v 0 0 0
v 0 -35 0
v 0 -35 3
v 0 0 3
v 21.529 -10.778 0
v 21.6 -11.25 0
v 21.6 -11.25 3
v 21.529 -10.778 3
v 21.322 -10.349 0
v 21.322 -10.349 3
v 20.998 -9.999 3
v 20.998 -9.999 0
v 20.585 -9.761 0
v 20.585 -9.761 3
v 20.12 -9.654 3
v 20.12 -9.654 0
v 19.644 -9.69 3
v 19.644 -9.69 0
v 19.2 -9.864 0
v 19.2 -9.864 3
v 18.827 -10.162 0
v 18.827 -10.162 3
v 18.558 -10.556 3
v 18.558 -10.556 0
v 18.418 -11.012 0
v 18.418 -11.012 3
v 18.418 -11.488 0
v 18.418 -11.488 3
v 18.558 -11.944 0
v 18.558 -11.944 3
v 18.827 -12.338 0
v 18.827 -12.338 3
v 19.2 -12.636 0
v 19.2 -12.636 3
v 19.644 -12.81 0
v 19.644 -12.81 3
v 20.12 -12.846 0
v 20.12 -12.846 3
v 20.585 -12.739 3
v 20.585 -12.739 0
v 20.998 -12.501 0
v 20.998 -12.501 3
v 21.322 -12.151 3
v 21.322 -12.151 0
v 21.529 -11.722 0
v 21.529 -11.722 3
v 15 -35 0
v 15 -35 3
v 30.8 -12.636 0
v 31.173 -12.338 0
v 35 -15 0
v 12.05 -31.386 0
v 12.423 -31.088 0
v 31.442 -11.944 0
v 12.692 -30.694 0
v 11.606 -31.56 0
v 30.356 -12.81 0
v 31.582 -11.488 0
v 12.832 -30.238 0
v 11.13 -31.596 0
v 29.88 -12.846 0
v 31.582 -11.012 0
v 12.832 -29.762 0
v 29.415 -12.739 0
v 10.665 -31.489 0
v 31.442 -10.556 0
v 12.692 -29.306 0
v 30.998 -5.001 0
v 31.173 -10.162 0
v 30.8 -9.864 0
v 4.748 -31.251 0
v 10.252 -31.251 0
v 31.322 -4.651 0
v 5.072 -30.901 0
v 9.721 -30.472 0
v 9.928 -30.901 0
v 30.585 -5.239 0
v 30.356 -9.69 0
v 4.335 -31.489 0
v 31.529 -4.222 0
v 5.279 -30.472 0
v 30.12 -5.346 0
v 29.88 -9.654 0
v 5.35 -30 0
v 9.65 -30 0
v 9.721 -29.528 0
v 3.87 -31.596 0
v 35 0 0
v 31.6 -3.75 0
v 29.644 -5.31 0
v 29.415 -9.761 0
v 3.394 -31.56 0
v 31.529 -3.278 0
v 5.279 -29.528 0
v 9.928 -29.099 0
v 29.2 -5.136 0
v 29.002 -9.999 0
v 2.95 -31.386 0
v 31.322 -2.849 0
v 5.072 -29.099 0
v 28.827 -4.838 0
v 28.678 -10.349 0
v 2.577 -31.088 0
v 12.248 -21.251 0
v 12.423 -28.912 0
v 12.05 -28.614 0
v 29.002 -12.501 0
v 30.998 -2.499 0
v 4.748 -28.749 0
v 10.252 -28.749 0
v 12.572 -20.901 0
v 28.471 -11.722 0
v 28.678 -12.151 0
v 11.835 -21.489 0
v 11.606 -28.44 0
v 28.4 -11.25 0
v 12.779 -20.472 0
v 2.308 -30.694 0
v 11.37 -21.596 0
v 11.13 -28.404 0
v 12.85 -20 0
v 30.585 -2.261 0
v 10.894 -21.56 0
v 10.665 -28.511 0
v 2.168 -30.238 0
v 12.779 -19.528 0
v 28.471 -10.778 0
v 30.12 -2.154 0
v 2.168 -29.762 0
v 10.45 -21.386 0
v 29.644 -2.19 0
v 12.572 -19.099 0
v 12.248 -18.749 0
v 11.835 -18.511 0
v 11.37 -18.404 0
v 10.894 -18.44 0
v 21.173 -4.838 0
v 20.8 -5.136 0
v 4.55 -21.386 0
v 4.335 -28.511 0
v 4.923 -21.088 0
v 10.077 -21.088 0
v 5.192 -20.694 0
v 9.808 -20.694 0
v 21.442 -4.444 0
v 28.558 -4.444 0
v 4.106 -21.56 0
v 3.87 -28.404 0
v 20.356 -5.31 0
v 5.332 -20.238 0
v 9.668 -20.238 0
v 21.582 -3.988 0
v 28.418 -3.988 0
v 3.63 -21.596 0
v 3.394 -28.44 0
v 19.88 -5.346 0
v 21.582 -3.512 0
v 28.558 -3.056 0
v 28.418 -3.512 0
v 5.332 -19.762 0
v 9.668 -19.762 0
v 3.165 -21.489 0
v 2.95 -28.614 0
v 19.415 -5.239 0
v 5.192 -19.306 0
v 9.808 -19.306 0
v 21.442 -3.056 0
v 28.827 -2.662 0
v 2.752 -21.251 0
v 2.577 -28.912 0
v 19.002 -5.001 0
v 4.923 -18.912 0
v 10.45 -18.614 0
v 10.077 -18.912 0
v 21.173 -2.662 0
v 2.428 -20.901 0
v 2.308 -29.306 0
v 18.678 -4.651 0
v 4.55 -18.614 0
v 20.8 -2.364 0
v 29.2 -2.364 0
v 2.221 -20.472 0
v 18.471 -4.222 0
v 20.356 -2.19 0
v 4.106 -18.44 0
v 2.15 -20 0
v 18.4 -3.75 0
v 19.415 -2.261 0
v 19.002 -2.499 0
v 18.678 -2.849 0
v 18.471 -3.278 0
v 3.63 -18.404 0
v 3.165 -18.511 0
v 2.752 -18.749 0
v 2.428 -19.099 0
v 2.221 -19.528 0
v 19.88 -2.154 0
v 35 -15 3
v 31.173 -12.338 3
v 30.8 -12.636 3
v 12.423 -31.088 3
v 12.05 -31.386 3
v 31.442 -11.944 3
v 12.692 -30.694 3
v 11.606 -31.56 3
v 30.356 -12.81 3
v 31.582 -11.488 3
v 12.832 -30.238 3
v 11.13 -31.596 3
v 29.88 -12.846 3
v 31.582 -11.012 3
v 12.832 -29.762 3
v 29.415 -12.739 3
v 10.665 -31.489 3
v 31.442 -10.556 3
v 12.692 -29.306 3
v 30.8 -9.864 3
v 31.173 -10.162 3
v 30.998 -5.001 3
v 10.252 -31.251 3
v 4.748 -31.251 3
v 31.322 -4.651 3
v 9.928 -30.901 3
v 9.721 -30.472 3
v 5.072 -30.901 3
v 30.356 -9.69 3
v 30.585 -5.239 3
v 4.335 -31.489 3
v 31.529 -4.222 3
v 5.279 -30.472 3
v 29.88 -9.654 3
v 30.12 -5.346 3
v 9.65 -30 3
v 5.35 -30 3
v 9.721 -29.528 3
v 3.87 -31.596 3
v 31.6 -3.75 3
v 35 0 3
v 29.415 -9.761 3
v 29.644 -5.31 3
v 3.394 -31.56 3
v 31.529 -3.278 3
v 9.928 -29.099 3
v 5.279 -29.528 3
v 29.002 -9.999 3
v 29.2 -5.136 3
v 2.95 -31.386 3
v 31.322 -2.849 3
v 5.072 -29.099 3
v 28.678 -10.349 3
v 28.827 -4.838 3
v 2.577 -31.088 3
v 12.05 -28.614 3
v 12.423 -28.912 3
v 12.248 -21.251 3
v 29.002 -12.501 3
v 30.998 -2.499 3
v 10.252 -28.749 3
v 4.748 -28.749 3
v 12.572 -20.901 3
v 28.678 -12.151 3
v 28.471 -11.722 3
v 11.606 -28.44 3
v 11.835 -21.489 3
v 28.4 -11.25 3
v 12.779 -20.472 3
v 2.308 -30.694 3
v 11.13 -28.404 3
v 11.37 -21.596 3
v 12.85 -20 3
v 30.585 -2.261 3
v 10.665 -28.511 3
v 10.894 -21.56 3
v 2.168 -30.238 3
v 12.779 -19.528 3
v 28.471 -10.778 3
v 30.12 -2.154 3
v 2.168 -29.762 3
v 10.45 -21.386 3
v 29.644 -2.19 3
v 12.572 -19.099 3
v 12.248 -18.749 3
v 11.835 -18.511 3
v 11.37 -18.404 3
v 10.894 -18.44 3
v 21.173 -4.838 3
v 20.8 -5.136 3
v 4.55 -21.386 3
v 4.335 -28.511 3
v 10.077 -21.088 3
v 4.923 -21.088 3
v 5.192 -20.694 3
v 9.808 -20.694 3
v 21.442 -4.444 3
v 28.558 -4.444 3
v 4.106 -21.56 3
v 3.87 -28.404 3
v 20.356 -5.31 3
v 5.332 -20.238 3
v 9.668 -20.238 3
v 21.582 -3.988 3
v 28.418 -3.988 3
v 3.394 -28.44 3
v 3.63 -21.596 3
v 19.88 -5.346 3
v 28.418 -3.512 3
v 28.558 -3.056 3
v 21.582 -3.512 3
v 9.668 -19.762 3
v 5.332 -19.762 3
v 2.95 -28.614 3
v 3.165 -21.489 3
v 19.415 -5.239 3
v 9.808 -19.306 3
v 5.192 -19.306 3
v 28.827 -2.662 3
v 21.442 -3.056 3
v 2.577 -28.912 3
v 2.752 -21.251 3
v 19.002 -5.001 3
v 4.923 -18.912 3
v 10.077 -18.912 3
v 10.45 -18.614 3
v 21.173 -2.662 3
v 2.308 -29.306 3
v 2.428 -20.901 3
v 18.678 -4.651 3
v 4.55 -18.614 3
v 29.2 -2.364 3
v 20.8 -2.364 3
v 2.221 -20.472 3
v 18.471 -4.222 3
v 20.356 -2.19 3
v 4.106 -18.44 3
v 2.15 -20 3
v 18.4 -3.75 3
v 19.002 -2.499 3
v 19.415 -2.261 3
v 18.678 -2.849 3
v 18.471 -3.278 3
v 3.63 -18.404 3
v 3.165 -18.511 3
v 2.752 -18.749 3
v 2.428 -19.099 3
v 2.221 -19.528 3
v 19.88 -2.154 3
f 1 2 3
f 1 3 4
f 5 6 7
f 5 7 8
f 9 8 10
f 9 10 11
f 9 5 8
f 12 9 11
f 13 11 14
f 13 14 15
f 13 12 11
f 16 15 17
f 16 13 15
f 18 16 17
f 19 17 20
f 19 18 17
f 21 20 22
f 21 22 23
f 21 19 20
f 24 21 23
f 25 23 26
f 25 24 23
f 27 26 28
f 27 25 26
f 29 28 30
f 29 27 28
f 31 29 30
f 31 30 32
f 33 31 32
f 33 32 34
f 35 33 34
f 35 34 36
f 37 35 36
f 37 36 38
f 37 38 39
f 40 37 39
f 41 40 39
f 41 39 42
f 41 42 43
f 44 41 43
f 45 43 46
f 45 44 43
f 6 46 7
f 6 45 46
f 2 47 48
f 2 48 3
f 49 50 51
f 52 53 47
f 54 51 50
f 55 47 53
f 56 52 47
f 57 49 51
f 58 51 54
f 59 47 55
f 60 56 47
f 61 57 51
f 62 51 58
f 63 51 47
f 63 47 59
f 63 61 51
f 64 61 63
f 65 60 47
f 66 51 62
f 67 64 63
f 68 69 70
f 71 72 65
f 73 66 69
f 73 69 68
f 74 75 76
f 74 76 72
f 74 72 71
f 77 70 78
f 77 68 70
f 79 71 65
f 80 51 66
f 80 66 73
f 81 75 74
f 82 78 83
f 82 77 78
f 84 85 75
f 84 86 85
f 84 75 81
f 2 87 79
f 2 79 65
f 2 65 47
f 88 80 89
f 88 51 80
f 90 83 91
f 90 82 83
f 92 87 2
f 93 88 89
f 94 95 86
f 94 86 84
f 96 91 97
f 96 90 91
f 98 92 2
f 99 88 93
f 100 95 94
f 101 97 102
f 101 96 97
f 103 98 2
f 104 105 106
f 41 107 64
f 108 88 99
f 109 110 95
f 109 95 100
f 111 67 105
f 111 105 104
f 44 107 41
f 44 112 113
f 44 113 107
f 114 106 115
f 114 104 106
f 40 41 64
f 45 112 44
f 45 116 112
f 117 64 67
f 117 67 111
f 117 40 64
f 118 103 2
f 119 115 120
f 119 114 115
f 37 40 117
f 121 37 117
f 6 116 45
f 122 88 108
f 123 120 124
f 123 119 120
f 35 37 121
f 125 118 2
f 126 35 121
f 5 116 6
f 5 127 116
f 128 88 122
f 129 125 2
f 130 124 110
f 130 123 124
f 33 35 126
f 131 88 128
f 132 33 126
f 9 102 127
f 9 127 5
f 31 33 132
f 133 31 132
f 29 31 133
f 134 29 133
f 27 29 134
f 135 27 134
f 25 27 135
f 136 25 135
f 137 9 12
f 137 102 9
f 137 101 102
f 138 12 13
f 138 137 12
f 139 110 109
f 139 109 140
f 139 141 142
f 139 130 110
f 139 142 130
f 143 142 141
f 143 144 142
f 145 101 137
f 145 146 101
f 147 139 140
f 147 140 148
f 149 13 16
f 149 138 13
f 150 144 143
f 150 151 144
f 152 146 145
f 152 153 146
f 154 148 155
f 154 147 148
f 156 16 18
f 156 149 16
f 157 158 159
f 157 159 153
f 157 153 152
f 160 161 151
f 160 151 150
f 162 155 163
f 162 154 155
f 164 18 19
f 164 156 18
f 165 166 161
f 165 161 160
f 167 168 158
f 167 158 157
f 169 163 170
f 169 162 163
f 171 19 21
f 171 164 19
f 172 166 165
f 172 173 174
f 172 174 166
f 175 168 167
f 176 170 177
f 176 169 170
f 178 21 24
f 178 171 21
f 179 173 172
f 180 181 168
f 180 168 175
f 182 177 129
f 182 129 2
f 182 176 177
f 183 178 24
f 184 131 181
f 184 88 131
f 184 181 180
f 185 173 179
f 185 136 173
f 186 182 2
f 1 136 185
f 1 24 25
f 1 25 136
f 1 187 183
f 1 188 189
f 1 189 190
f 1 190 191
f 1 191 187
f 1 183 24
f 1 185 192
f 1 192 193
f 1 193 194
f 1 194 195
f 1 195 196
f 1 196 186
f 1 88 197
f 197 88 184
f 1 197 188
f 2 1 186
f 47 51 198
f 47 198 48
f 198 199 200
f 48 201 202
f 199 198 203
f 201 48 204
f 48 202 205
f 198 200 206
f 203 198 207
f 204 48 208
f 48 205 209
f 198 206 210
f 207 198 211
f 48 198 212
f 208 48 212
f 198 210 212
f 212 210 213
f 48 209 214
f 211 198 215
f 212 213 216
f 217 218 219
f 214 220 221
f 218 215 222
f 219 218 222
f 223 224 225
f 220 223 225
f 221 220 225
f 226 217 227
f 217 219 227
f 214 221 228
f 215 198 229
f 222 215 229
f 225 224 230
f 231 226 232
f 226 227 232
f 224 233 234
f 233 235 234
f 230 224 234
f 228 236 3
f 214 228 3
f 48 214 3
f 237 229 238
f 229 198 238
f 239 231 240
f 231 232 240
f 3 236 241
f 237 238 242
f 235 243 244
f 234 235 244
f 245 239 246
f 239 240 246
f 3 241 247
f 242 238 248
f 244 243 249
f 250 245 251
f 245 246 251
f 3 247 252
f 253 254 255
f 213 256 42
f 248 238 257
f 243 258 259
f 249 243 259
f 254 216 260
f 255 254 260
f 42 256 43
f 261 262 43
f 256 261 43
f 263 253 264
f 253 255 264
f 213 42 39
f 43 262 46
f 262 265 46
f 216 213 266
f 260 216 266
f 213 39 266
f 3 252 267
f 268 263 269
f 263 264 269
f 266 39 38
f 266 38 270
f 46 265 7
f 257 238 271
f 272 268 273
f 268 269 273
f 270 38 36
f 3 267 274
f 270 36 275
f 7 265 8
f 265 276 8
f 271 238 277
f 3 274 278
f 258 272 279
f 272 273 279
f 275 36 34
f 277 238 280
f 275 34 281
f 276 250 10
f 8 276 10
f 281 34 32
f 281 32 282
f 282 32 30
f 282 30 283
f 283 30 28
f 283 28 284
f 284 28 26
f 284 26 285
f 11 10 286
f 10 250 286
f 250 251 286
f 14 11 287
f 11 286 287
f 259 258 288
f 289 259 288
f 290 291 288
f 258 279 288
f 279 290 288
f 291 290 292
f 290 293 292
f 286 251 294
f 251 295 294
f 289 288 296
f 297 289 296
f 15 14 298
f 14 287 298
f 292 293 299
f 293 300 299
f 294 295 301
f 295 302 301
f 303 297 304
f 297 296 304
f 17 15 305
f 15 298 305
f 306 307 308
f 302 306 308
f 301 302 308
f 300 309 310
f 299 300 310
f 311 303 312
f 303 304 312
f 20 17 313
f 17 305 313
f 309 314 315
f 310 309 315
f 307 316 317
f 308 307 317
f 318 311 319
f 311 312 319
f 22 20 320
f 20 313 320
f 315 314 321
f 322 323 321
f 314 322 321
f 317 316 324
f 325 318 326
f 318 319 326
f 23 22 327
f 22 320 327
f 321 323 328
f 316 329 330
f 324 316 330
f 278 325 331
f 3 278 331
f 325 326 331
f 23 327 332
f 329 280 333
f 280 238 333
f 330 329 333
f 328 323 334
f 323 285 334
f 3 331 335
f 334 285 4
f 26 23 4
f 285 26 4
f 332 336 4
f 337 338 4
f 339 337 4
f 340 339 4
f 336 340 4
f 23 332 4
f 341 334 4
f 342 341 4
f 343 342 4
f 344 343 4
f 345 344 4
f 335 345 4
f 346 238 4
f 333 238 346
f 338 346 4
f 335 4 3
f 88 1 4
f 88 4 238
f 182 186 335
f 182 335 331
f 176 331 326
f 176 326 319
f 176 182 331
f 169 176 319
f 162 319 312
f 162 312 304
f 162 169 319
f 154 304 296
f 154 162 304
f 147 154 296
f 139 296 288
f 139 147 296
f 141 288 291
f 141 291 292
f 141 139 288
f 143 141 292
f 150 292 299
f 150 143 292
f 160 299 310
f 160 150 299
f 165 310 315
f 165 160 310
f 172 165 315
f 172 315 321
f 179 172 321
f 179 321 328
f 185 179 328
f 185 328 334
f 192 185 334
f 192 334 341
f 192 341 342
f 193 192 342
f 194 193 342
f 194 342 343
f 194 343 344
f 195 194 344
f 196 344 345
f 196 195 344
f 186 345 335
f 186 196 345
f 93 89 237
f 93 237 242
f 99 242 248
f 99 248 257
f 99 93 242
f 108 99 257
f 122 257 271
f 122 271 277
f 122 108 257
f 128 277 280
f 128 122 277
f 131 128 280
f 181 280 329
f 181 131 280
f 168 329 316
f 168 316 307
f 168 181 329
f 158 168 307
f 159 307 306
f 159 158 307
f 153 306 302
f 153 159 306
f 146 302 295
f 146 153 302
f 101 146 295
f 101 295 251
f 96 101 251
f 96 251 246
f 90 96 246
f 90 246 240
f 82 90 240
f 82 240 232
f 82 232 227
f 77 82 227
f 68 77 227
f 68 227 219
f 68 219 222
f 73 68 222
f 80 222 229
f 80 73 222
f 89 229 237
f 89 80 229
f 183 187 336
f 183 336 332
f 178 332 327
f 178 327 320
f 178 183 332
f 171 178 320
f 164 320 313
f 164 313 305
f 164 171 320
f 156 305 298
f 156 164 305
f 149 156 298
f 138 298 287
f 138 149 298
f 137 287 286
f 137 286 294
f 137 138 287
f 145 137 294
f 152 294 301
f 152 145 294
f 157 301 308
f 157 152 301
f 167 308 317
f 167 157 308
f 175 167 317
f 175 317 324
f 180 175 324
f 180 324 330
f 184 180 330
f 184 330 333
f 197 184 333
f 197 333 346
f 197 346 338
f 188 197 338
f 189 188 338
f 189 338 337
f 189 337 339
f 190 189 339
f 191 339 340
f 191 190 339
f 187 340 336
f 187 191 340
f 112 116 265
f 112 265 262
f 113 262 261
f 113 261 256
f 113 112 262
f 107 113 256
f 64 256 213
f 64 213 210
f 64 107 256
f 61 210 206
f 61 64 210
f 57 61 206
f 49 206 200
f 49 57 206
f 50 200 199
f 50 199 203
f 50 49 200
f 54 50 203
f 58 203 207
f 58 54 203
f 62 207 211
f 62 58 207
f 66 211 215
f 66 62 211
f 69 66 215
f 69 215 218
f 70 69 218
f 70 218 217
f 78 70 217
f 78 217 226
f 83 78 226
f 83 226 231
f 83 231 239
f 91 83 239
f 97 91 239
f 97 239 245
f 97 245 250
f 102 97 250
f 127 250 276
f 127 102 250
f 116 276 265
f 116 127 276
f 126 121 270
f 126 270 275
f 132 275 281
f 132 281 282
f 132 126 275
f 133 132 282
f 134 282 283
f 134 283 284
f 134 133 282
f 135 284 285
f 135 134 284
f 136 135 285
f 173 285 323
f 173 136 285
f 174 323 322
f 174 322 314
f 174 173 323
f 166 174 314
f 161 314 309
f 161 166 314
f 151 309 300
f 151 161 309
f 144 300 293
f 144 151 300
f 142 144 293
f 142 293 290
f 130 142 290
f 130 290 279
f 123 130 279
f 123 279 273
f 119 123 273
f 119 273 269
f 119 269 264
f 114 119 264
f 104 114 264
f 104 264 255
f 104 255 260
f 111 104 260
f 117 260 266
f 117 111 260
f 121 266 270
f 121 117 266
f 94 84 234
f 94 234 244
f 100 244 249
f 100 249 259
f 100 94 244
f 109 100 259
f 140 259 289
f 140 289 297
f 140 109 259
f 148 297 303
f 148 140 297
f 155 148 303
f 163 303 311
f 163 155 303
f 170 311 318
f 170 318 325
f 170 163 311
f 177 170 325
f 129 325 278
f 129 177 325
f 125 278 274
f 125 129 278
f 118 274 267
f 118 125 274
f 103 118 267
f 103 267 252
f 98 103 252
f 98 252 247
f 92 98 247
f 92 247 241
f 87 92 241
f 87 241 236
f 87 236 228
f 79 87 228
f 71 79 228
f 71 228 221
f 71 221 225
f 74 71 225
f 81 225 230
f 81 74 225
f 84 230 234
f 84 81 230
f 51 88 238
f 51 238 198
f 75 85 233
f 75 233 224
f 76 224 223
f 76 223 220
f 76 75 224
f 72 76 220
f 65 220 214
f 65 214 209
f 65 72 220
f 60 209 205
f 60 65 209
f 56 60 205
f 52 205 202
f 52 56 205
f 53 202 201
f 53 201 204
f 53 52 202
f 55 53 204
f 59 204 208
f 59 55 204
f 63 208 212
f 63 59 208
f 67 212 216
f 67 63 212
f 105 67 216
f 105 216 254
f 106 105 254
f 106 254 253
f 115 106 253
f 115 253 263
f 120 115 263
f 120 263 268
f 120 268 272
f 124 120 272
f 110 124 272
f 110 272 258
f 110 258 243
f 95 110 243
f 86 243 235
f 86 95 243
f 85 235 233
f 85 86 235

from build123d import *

# Parameters (mm, degrees)
SKETCH_1_R      = 1.6
EXTRUDE_1_DEPTH = 3


with BuildPart() as part:
    # 草图1 → 凸台-拉伸1 (new body)
    with BuildSketch(Plane.XY):
        Polygon((0, 0), (35, 0), (35, -15), (15, -35), (0, -35), align=None)
        with Locations((3.75, -30)):
            Circle(SKETCH_1_R, mode=Mode.SUBTRACT)
        with Locations(Location((11.25, -30, 0), (0, 0, 180))):
            Circle(SKETCH_1_R, mode=Mode.SUBTRACT)
        with Locations((11.25, -20)):
            Circle(SKETCH_1_R, mode=Mode.SUBTRACT)
        with Locations(Location((3.75, -20, 0), (0, 0, 180))):
            Circle(SKETCH_1_R, mode=Mode.SUBTRACT)
        with Locations((30, -3.75)):
            Circle(SKETCH_1_R, mode=Mode.SUBTRACT)
        with Locations(Location((30, -11.25, 0), (0, 0, 180))):
            Circle(SKETCH_1_R, mode=Mode.SUBTRACT)
        with Locations((20, -11.25)):
            Circle(SKETCH_1_R, mode=Mode.SUBTRACT)
        with Locations(Location((20, -3.75, 0), (0, 0, 180))):
            Circle(SKETCH_1_R, mode=Mode.SUBTRACT)
    extrude(amount=EXTRUDE_1_DEPTH)


solid = part.part
